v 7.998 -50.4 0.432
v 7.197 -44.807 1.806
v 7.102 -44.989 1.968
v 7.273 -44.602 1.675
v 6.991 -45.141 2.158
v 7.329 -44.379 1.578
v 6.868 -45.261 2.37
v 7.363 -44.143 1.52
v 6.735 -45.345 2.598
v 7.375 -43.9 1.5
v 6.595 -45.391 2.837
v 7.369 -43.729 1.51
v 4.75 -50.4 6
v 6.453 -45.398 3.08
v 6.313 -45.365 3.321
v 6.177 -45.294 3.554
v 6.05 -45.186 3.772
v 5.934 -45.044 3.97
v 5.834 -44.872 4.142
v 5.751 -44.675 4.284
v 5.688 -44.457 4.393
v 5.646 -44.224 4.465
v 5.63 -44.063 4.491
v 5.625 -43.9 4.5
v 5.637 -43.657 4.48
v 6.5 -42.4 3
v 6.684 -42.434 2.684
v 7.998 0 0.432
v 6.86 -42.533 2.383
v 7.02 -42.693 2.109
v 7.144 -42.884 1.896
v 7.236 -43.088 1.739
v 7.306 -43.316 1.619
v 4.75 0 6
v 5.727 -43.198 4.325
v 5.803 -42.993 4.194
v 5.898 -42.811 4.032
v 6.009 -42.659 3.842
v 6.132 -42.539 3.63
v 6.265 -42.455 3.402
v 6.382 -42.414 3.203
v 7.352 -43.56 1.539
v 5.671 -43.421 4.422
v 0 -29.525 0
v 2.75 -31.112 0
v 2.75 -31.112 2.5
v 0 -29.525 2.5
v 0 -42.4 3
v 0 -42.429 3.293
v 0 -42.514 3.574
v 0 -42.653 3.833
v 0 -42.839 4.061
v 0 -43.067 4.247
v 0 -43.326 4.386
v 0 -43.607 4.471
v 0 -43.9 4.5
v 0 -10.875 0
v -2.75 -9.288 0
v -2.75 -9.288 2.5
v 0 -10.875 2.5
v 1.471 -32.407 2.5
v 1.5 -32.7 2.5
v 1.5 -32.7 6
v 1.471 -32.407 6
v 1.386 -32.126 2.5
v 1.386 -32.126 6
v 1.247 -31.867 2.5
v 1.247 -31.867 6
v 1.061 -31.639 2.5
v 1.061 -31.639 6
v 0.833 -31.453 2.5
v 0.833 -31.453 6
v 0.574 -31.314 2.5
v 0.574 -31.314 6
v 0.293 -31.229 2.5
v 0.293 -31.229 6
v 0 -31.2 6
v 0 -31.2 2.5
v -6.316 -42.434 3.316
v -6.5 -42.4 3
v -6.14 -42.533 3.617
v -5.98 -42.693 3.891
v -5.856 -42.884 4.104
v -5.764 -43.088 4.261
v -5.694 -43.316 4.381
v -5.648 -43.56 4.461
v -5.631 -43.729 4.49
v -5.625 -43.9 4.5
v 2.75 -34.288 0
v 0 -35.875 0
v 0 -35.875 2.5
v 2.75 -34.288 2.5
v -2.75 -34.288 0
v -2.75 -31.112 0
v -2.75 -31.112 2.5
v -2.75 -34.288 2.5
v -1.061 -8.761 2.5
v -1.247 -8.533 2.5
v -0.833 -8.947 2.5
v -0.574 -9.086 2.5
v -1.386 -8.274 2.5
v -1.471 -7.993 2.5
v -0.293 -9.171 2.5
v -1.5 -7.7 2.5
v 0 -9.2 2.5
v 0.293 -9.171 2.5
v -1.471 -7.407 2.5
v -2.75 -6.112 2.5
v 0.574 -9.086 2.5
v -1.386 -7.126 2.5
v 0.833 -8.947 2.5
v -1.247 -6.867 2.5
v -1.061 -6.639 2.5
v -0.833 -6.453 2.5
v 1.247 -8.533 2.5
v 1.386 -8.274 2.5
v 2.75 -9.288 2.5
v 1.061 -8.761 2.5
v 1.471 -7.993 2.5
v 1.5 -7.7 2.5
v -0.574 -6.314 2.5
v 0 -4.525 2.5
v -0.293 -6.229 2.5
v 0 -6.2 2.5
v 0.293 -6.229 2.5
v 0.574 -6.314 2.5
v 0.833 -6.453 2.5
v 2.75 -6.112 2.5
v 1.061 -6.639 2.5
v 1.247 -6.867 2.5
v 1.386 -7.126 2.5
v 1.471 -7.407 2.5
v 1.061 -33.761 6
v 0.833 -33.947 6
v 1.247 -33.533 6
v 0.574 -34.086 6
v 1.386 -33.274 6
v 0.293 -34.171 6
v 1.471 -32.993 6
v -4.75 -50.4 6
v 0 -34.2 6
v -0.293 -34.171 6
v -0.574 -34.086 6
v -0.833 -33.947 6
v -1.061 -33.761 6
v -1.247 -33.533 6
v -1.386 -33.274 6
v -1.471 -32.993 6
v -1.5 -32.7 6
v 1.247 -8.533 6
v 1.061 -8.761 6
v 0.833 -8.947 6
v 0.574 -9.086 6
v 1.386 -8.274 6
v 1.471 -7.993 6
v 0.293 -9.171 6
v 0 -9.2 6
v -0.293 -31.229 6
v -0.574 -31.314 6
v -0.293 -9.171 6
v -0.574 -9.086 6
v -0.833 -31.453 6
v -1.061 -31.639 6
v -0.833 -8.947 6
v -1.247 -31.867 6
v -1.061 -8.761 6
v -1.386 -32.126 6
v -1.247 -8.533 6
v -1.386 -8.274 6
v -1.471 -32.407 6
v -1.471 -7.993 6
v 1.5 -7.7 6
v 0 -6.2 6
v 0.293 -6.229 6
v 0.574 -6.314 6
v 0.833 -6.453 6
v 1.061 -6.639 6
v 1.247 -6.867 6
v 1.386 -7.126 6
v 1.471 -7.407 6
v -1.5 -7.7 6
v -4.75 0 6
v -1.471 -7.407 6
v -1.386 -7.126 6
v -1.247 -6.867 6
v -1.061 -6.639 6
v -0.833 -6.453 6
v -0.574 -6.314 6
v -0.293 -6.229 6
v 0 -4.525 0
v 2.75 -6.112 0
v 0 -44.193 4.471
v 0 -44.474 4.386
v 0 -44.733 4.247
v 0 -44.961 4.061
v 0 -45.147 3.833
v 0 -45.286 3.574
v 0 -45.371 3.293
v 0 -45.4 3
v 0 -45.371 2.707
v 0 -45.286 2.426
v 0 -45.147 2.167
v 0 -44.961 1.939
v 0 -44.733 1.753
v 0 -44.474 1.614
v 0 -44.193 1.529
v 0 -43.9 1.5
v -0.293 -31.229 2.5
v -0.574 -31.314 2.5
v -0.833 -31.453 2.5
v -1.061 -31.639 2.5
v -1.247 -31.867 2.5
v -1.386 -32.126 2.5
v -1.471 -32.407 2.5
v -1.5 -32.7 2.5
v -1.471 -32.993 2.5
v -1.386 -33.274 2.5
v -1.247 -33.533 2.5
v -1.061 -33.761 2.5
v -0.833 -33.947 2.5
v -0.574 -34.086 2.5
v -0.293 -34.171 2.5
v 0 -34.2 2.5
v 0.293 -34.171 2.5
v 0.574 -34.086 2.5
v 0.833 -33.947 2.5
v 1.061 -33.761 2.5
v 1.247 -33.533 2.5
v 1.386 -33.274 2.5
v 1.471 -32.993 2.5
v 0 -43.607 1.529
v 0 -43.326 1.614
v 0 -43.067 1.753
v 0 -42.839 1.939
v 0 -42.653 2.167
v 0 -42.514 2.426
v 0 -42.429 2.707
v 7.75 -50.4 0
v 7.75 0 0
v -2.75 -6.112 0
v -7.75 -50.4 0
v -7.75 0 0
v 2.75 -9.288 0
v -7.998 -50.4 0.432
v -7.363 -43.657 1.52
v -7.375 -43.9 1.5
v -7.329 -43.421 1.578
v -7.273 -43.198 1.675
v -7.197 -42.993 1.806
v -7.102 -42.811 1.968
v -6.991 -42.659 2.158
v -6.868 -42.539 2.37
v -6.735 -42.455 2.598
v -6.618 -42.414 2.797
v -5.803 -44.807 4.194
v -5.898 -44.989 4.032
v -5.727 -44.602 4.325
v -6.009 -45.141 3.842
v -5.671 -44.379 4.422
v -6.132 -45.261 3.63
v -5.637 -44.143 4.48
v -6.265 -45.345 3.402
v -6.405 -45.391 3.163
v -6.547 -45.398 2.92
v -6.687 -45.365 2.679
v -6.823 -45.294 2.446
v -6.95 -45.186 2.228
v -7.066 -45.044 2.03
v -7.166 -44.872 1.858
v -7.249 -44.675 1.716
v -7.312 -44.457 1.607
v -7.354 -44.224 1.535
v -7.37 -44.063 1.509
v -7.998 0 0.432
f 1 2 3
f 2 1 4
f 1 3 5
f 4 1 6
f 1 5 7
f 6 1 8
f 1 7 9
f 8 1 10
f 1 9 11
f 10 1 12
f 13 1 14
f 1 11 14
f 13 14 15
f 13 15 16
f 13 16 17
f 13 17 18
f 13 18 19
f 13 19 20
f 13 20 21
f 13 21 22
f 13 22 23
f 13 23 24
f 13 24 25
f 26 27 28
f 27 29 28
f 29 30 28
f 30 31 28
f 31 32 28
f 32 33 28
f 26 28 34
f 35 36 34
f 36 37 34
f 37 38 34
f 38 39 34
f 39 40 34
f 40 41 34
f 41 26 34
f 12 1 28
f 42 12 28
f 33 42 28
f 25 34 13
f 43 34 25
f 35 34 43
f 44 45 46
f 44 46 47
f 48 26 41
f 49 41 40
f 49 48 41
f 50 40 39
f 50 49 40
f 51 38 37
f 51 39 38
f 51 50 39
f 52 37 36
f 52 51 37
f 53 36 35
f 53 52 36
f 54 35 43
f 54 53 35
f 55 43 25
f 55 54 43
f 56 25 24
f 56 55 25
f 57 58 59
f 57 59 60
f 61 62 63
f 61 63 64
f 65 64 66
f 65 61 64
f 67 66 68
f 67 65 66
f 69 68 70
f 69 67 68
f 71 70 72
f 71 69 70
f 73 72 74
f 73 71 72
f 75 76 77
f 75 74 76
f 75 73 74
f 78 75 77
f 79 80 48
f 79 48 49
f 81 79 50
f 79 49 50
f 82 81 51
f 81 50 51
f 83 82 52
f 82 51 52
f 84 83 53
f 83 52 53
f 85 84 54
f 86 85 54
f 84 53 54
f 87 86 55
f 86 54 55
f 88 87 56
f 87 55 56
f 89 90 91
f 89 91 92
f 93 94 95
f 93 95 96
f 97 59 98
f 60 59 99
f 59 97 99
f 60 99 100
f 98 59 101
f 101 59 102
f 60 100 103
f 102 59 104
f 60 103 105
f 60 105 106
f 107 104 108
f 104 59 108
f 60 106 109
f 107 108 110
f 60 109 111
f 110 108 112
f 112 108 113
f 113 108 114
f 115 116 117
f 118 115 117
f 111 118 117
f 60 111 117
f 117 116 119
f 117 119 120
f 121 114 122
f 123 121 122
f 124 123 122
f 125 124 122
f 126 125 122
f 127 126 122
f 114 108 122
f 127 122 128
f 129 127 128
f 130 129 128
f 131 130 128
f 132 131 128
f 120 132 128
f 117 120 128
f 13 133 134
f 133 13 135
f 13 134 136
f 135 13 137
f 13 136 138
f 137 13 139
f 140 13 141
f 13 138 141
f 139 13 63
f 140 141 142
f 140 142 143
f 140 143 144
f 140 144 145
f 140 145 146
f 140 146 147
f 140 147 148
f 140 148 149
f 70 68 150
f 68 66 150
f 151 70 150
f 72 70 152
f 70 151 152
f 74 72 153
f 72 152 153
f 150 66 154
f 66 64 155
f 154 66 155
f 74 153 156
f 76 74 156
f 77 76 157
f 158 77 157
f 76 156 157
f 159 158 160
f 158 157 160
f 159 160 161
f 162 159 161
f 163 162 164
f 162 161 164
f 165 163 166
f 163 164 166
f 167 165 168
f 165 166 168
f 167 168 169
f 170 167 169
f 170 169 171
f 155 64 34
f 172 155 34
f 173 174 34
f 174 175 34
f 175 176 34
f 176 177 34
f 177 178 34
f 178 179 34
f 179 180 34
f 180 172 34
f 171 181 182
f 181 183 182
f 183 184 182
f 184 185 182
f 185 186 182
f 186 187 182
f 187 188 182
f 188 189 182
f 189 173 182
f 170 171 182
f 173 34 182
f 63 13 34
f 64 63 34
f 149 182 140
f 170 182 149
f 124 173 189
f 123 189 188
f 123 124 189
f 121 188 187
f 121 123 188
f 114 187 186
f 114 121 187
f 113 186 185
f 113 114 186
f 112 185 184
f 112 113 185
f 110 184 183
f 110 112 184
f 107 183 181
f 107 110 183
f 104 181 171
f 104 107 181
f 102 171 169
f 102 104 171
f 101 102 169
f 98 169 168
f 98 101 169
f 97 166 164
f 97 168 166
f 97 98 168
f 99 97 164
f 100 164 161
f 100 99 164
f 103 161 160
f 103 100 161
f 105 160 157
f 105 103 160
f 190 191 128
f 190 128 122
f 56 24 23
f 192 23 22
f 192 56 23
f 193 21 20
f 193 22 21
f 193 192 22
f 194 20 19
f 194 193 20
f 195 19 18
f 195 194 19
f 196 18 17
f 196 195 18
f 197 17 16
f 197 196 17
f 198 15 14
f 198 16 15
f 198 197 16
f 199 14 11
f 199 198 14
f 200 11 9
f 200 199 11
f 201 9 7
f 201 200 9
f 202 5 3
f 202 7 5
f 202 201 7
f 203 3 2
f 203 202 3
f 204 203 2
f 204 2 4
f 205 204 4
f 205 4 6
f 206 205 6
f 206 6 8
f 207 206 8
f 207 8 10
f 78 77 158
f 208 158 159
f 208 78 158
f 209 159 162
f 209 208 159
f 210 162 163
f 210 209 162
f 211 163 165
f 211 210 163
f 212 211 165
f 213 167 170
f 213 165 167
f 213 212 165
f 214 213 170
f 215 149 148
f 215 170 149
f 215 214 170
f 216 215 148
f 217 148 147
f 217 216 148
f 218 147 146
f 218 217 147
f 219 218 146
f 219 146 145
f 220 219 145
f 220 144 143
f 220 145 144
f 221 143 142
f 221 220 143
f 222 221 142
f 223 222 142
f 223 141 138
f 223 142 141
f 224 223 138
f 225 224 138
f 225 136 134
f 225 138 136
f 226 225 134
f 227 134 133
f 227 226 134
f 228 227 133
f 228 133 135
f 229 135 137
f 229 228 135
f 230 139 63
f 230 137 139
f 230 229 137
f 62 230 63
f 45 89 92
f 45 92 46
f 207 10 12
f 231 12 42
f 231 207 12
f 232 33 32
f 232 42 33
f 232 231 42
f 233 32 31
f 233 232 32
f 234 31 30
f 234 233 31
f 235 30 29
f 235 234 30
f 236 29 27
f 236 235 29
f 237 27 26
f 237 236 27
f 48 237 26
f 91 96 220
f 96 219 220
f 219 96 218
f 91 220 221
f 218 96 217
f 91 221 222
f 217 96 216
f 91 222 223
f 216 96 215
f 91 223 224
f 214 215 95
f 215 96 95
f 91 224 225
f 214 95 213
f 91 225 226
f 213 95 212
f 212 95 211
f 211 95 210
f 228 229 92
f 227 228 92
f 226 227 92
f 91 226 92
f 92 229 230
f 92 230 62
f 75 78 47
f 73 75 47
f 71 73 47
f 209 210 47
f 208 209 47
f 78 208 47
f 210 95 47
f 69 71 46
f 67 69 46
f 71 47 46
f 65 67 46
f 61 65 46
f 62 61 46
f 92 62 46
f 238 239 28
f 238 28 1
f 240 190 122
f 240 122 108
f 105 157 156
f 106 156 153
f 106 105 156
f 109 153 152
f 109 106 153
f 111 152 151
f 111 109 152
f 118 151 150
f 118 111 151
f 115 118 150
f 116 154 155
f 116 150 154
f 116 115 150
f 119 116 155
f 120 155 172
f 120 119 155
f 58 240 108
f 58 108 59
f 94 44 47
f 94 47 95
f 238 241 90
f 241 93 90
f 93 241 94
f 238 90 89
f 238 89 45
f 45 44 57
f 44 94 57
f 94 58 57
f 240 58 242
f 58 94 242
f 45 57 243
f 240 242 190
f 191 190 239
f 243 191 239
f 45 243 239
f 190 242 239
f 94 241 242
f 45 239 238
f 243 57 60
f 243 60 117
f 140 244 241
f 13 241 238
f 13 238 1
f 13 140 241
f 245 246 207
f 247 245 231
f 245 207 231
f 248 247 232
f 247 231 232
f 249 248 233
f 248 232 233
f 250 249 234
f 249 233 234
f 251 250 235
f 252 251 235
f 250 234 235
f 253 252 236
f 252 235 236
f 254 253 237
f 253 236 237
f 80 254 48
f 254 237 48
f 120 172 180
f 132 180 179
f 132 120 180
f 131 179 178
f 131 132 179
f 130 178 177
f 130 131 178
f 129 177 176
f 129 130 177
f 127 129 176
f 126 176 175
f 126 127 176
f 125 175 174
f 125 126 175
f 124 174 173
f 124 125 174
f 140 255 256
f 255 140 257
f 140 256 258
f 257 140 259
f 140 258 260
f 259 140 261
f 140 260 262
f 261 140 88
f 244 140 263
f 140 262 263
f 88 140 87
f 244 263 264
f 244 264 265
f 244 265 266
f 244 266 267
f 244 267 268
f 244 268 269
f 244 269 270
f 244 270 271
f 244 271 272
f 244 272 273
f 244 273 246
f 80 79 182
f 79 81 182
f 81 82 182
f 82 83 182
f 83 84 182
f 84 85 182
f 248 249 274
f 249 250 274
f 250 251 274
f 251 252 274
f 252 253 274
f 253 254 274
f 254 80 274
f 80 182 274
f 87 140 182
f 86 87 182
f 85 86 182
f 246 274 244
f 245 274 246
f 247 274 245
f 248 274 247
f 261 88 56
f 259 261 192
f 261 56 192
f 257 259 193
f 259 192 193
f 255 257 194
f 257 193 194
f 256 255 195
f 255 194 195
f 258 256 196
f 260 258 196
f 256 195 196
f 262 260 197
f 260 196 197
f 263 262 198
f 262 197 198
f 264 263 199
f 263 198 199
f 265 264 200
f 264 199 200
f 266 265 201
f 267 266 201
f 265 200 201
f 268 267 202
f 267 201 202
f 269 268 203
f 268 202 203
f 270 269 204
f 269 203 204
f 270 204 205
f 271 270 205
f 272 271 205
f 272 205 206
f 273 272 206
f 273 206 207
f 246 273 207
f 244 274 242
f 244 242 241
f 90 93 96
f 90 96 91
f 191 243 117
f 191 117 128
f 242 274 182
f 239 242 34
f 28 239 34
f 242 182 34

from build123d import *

# Parameters (mm, degrees)
F1_DEPTH      = 50.4
F3_DEPTH      = 6.001
F4_DEPTH      = 2.5
F6_DEPTH      = 8.251
F6_DEPTH_BACK = 8.251
F7_SIZE       = 0.5


with BuildPart() as f1:
    # F0 (on Front) → F1 (new body)
    with BuildSketch(Plane.XZ):
        Polygon((8.25, 0), (4.75, 6), (-4.75, 6), (-8.25, 0), align=None)
    extrude(amount=F1_DEPTH)

    # F2 (on Top) → F3 (cut, through all)
    with BuildSketch(Plane.XY):
        with BuildLine():
            ThreePointArc((1.5, -32.7), (1.0606601718, -31.6393398282), (0, -31.2))
            ThreePointArc((0, -31.2), (-1.0606601718, -33.7606601718), (1.5, -32.7))
        make_face()
        with BuildLine():
            ThreePointArc((0, -6.2), (-1.5, -7.7), (0, -9.2))
            Line((0, -9.2), (0, -6.2))
        make_face()
        with BuildLine():
            Line((0, -6.2), (0, -9.2))
            ThreePointArc((0, -9.2), (1.0606601718, -8.7606601718), (1.5, -7.7))
            ThreePointArc((1.5, -7.7), (1.0606601718, -6.6393398282), (0, -6.2))
        make_face()
    extrude(amount=F3_DEPTH, mode=Mode.SUBTRACT)

    # F2 (on Top) → F4 (cut)
    with BuildSketch(Plane.XY):
        Polygon((2.75, -31.1122867597), (0, -29.5245735195), (-2.75, -31.1122867597), (-2.75, -34.2877132403), (0, -35.8754264805), (2.75, -34.2877132403), align=None)
        with BuildLine():
            ThreePointArc((1.5, -32.7), (-1.0606601718, -33.7606601718), (0, -31.2))
            ThreePointArc((0, -31.2), (1.0606601718, -31.6393398282), (1.5, -32.7))
        make_face(mode=Mode.SUBTRACT)
        with BuildLine():
            Line((-2.75, -9.2877132403), (0, -10.8754264805))
            Line((0, -10.8754264805), (0, -9.2))
            ThreePointArc((0, -9.2), (-1.5, -7.7), (0, -6.2))
            Line((0, -6.2), (0, -4.5245735195))
            Line((0, -4.5245735195), (-2.75, -6.1122867597))
            Line((-2.75, -6.1122867597), (-2.75, -9.2877132403))
        make_face()
        with BuildLine():
            Line((0, -9.2), (0, -10.8754264805))
            Line((0, -10.8754264805), (2.75, -9.2877132403))
            Line((2.75, -9.2877132403), (2.75, -6.1122867597))
            Line((2.75, -6.1122867597), (0, -4.5245735195))
            Line((0, -4.5245735195), (0, -6.2))
            ThreePointArc((0, -6.2), (1.0606601718, -6.6393398282), (1.5, -7.7))
            ThreePointArc((1.5, -7.7), (1.0606601718, -8.7606601718), (0, -9.2))
        make_face()
    extrude(amount=F4_DEPTH, mode=Mode.SUBTRACT)

    # F5 (on Right) → F6 (cut, two sides)
    with BuildSketch(Plane.YZ) as f6_sk:
        with BuildLine():
            ThreePointArc((-43.9, 4.5), (-45.4, 3), (-43.9, 1.5))
            Line((-43.9, 1.5), (-43.9, 4.5))
        make_face()
        with BuildLine():
            Line((-43.9, 4.5), (-43.9, 1.5))
            ThreePointArc((-43.9, 1.5), (-42.8393398282, 1.9393398282), (-42.4, 3))
            ThreePointArc((-42.4, 3), (-42.8393398282, 4.0606601718), (-43.9, 4.5))
        make_face()
    extrude(amount=-F6_DEPTH, mode=Mode.SUBTRACT)
    extrude(f6_sk.sketch, amount=F6_DEPTH_BACK, mode=Mode.SUBTRACT)

    # F7
    f7_edges = [f1.edges().sort_by_distance(p)[0] for p in [
        (-8.25, -25.2, 0),
        (8.25, -25.2, 0),
    ]]
    chamfer(f7_edges, length=F7_SIZE)


solid = f1.part
